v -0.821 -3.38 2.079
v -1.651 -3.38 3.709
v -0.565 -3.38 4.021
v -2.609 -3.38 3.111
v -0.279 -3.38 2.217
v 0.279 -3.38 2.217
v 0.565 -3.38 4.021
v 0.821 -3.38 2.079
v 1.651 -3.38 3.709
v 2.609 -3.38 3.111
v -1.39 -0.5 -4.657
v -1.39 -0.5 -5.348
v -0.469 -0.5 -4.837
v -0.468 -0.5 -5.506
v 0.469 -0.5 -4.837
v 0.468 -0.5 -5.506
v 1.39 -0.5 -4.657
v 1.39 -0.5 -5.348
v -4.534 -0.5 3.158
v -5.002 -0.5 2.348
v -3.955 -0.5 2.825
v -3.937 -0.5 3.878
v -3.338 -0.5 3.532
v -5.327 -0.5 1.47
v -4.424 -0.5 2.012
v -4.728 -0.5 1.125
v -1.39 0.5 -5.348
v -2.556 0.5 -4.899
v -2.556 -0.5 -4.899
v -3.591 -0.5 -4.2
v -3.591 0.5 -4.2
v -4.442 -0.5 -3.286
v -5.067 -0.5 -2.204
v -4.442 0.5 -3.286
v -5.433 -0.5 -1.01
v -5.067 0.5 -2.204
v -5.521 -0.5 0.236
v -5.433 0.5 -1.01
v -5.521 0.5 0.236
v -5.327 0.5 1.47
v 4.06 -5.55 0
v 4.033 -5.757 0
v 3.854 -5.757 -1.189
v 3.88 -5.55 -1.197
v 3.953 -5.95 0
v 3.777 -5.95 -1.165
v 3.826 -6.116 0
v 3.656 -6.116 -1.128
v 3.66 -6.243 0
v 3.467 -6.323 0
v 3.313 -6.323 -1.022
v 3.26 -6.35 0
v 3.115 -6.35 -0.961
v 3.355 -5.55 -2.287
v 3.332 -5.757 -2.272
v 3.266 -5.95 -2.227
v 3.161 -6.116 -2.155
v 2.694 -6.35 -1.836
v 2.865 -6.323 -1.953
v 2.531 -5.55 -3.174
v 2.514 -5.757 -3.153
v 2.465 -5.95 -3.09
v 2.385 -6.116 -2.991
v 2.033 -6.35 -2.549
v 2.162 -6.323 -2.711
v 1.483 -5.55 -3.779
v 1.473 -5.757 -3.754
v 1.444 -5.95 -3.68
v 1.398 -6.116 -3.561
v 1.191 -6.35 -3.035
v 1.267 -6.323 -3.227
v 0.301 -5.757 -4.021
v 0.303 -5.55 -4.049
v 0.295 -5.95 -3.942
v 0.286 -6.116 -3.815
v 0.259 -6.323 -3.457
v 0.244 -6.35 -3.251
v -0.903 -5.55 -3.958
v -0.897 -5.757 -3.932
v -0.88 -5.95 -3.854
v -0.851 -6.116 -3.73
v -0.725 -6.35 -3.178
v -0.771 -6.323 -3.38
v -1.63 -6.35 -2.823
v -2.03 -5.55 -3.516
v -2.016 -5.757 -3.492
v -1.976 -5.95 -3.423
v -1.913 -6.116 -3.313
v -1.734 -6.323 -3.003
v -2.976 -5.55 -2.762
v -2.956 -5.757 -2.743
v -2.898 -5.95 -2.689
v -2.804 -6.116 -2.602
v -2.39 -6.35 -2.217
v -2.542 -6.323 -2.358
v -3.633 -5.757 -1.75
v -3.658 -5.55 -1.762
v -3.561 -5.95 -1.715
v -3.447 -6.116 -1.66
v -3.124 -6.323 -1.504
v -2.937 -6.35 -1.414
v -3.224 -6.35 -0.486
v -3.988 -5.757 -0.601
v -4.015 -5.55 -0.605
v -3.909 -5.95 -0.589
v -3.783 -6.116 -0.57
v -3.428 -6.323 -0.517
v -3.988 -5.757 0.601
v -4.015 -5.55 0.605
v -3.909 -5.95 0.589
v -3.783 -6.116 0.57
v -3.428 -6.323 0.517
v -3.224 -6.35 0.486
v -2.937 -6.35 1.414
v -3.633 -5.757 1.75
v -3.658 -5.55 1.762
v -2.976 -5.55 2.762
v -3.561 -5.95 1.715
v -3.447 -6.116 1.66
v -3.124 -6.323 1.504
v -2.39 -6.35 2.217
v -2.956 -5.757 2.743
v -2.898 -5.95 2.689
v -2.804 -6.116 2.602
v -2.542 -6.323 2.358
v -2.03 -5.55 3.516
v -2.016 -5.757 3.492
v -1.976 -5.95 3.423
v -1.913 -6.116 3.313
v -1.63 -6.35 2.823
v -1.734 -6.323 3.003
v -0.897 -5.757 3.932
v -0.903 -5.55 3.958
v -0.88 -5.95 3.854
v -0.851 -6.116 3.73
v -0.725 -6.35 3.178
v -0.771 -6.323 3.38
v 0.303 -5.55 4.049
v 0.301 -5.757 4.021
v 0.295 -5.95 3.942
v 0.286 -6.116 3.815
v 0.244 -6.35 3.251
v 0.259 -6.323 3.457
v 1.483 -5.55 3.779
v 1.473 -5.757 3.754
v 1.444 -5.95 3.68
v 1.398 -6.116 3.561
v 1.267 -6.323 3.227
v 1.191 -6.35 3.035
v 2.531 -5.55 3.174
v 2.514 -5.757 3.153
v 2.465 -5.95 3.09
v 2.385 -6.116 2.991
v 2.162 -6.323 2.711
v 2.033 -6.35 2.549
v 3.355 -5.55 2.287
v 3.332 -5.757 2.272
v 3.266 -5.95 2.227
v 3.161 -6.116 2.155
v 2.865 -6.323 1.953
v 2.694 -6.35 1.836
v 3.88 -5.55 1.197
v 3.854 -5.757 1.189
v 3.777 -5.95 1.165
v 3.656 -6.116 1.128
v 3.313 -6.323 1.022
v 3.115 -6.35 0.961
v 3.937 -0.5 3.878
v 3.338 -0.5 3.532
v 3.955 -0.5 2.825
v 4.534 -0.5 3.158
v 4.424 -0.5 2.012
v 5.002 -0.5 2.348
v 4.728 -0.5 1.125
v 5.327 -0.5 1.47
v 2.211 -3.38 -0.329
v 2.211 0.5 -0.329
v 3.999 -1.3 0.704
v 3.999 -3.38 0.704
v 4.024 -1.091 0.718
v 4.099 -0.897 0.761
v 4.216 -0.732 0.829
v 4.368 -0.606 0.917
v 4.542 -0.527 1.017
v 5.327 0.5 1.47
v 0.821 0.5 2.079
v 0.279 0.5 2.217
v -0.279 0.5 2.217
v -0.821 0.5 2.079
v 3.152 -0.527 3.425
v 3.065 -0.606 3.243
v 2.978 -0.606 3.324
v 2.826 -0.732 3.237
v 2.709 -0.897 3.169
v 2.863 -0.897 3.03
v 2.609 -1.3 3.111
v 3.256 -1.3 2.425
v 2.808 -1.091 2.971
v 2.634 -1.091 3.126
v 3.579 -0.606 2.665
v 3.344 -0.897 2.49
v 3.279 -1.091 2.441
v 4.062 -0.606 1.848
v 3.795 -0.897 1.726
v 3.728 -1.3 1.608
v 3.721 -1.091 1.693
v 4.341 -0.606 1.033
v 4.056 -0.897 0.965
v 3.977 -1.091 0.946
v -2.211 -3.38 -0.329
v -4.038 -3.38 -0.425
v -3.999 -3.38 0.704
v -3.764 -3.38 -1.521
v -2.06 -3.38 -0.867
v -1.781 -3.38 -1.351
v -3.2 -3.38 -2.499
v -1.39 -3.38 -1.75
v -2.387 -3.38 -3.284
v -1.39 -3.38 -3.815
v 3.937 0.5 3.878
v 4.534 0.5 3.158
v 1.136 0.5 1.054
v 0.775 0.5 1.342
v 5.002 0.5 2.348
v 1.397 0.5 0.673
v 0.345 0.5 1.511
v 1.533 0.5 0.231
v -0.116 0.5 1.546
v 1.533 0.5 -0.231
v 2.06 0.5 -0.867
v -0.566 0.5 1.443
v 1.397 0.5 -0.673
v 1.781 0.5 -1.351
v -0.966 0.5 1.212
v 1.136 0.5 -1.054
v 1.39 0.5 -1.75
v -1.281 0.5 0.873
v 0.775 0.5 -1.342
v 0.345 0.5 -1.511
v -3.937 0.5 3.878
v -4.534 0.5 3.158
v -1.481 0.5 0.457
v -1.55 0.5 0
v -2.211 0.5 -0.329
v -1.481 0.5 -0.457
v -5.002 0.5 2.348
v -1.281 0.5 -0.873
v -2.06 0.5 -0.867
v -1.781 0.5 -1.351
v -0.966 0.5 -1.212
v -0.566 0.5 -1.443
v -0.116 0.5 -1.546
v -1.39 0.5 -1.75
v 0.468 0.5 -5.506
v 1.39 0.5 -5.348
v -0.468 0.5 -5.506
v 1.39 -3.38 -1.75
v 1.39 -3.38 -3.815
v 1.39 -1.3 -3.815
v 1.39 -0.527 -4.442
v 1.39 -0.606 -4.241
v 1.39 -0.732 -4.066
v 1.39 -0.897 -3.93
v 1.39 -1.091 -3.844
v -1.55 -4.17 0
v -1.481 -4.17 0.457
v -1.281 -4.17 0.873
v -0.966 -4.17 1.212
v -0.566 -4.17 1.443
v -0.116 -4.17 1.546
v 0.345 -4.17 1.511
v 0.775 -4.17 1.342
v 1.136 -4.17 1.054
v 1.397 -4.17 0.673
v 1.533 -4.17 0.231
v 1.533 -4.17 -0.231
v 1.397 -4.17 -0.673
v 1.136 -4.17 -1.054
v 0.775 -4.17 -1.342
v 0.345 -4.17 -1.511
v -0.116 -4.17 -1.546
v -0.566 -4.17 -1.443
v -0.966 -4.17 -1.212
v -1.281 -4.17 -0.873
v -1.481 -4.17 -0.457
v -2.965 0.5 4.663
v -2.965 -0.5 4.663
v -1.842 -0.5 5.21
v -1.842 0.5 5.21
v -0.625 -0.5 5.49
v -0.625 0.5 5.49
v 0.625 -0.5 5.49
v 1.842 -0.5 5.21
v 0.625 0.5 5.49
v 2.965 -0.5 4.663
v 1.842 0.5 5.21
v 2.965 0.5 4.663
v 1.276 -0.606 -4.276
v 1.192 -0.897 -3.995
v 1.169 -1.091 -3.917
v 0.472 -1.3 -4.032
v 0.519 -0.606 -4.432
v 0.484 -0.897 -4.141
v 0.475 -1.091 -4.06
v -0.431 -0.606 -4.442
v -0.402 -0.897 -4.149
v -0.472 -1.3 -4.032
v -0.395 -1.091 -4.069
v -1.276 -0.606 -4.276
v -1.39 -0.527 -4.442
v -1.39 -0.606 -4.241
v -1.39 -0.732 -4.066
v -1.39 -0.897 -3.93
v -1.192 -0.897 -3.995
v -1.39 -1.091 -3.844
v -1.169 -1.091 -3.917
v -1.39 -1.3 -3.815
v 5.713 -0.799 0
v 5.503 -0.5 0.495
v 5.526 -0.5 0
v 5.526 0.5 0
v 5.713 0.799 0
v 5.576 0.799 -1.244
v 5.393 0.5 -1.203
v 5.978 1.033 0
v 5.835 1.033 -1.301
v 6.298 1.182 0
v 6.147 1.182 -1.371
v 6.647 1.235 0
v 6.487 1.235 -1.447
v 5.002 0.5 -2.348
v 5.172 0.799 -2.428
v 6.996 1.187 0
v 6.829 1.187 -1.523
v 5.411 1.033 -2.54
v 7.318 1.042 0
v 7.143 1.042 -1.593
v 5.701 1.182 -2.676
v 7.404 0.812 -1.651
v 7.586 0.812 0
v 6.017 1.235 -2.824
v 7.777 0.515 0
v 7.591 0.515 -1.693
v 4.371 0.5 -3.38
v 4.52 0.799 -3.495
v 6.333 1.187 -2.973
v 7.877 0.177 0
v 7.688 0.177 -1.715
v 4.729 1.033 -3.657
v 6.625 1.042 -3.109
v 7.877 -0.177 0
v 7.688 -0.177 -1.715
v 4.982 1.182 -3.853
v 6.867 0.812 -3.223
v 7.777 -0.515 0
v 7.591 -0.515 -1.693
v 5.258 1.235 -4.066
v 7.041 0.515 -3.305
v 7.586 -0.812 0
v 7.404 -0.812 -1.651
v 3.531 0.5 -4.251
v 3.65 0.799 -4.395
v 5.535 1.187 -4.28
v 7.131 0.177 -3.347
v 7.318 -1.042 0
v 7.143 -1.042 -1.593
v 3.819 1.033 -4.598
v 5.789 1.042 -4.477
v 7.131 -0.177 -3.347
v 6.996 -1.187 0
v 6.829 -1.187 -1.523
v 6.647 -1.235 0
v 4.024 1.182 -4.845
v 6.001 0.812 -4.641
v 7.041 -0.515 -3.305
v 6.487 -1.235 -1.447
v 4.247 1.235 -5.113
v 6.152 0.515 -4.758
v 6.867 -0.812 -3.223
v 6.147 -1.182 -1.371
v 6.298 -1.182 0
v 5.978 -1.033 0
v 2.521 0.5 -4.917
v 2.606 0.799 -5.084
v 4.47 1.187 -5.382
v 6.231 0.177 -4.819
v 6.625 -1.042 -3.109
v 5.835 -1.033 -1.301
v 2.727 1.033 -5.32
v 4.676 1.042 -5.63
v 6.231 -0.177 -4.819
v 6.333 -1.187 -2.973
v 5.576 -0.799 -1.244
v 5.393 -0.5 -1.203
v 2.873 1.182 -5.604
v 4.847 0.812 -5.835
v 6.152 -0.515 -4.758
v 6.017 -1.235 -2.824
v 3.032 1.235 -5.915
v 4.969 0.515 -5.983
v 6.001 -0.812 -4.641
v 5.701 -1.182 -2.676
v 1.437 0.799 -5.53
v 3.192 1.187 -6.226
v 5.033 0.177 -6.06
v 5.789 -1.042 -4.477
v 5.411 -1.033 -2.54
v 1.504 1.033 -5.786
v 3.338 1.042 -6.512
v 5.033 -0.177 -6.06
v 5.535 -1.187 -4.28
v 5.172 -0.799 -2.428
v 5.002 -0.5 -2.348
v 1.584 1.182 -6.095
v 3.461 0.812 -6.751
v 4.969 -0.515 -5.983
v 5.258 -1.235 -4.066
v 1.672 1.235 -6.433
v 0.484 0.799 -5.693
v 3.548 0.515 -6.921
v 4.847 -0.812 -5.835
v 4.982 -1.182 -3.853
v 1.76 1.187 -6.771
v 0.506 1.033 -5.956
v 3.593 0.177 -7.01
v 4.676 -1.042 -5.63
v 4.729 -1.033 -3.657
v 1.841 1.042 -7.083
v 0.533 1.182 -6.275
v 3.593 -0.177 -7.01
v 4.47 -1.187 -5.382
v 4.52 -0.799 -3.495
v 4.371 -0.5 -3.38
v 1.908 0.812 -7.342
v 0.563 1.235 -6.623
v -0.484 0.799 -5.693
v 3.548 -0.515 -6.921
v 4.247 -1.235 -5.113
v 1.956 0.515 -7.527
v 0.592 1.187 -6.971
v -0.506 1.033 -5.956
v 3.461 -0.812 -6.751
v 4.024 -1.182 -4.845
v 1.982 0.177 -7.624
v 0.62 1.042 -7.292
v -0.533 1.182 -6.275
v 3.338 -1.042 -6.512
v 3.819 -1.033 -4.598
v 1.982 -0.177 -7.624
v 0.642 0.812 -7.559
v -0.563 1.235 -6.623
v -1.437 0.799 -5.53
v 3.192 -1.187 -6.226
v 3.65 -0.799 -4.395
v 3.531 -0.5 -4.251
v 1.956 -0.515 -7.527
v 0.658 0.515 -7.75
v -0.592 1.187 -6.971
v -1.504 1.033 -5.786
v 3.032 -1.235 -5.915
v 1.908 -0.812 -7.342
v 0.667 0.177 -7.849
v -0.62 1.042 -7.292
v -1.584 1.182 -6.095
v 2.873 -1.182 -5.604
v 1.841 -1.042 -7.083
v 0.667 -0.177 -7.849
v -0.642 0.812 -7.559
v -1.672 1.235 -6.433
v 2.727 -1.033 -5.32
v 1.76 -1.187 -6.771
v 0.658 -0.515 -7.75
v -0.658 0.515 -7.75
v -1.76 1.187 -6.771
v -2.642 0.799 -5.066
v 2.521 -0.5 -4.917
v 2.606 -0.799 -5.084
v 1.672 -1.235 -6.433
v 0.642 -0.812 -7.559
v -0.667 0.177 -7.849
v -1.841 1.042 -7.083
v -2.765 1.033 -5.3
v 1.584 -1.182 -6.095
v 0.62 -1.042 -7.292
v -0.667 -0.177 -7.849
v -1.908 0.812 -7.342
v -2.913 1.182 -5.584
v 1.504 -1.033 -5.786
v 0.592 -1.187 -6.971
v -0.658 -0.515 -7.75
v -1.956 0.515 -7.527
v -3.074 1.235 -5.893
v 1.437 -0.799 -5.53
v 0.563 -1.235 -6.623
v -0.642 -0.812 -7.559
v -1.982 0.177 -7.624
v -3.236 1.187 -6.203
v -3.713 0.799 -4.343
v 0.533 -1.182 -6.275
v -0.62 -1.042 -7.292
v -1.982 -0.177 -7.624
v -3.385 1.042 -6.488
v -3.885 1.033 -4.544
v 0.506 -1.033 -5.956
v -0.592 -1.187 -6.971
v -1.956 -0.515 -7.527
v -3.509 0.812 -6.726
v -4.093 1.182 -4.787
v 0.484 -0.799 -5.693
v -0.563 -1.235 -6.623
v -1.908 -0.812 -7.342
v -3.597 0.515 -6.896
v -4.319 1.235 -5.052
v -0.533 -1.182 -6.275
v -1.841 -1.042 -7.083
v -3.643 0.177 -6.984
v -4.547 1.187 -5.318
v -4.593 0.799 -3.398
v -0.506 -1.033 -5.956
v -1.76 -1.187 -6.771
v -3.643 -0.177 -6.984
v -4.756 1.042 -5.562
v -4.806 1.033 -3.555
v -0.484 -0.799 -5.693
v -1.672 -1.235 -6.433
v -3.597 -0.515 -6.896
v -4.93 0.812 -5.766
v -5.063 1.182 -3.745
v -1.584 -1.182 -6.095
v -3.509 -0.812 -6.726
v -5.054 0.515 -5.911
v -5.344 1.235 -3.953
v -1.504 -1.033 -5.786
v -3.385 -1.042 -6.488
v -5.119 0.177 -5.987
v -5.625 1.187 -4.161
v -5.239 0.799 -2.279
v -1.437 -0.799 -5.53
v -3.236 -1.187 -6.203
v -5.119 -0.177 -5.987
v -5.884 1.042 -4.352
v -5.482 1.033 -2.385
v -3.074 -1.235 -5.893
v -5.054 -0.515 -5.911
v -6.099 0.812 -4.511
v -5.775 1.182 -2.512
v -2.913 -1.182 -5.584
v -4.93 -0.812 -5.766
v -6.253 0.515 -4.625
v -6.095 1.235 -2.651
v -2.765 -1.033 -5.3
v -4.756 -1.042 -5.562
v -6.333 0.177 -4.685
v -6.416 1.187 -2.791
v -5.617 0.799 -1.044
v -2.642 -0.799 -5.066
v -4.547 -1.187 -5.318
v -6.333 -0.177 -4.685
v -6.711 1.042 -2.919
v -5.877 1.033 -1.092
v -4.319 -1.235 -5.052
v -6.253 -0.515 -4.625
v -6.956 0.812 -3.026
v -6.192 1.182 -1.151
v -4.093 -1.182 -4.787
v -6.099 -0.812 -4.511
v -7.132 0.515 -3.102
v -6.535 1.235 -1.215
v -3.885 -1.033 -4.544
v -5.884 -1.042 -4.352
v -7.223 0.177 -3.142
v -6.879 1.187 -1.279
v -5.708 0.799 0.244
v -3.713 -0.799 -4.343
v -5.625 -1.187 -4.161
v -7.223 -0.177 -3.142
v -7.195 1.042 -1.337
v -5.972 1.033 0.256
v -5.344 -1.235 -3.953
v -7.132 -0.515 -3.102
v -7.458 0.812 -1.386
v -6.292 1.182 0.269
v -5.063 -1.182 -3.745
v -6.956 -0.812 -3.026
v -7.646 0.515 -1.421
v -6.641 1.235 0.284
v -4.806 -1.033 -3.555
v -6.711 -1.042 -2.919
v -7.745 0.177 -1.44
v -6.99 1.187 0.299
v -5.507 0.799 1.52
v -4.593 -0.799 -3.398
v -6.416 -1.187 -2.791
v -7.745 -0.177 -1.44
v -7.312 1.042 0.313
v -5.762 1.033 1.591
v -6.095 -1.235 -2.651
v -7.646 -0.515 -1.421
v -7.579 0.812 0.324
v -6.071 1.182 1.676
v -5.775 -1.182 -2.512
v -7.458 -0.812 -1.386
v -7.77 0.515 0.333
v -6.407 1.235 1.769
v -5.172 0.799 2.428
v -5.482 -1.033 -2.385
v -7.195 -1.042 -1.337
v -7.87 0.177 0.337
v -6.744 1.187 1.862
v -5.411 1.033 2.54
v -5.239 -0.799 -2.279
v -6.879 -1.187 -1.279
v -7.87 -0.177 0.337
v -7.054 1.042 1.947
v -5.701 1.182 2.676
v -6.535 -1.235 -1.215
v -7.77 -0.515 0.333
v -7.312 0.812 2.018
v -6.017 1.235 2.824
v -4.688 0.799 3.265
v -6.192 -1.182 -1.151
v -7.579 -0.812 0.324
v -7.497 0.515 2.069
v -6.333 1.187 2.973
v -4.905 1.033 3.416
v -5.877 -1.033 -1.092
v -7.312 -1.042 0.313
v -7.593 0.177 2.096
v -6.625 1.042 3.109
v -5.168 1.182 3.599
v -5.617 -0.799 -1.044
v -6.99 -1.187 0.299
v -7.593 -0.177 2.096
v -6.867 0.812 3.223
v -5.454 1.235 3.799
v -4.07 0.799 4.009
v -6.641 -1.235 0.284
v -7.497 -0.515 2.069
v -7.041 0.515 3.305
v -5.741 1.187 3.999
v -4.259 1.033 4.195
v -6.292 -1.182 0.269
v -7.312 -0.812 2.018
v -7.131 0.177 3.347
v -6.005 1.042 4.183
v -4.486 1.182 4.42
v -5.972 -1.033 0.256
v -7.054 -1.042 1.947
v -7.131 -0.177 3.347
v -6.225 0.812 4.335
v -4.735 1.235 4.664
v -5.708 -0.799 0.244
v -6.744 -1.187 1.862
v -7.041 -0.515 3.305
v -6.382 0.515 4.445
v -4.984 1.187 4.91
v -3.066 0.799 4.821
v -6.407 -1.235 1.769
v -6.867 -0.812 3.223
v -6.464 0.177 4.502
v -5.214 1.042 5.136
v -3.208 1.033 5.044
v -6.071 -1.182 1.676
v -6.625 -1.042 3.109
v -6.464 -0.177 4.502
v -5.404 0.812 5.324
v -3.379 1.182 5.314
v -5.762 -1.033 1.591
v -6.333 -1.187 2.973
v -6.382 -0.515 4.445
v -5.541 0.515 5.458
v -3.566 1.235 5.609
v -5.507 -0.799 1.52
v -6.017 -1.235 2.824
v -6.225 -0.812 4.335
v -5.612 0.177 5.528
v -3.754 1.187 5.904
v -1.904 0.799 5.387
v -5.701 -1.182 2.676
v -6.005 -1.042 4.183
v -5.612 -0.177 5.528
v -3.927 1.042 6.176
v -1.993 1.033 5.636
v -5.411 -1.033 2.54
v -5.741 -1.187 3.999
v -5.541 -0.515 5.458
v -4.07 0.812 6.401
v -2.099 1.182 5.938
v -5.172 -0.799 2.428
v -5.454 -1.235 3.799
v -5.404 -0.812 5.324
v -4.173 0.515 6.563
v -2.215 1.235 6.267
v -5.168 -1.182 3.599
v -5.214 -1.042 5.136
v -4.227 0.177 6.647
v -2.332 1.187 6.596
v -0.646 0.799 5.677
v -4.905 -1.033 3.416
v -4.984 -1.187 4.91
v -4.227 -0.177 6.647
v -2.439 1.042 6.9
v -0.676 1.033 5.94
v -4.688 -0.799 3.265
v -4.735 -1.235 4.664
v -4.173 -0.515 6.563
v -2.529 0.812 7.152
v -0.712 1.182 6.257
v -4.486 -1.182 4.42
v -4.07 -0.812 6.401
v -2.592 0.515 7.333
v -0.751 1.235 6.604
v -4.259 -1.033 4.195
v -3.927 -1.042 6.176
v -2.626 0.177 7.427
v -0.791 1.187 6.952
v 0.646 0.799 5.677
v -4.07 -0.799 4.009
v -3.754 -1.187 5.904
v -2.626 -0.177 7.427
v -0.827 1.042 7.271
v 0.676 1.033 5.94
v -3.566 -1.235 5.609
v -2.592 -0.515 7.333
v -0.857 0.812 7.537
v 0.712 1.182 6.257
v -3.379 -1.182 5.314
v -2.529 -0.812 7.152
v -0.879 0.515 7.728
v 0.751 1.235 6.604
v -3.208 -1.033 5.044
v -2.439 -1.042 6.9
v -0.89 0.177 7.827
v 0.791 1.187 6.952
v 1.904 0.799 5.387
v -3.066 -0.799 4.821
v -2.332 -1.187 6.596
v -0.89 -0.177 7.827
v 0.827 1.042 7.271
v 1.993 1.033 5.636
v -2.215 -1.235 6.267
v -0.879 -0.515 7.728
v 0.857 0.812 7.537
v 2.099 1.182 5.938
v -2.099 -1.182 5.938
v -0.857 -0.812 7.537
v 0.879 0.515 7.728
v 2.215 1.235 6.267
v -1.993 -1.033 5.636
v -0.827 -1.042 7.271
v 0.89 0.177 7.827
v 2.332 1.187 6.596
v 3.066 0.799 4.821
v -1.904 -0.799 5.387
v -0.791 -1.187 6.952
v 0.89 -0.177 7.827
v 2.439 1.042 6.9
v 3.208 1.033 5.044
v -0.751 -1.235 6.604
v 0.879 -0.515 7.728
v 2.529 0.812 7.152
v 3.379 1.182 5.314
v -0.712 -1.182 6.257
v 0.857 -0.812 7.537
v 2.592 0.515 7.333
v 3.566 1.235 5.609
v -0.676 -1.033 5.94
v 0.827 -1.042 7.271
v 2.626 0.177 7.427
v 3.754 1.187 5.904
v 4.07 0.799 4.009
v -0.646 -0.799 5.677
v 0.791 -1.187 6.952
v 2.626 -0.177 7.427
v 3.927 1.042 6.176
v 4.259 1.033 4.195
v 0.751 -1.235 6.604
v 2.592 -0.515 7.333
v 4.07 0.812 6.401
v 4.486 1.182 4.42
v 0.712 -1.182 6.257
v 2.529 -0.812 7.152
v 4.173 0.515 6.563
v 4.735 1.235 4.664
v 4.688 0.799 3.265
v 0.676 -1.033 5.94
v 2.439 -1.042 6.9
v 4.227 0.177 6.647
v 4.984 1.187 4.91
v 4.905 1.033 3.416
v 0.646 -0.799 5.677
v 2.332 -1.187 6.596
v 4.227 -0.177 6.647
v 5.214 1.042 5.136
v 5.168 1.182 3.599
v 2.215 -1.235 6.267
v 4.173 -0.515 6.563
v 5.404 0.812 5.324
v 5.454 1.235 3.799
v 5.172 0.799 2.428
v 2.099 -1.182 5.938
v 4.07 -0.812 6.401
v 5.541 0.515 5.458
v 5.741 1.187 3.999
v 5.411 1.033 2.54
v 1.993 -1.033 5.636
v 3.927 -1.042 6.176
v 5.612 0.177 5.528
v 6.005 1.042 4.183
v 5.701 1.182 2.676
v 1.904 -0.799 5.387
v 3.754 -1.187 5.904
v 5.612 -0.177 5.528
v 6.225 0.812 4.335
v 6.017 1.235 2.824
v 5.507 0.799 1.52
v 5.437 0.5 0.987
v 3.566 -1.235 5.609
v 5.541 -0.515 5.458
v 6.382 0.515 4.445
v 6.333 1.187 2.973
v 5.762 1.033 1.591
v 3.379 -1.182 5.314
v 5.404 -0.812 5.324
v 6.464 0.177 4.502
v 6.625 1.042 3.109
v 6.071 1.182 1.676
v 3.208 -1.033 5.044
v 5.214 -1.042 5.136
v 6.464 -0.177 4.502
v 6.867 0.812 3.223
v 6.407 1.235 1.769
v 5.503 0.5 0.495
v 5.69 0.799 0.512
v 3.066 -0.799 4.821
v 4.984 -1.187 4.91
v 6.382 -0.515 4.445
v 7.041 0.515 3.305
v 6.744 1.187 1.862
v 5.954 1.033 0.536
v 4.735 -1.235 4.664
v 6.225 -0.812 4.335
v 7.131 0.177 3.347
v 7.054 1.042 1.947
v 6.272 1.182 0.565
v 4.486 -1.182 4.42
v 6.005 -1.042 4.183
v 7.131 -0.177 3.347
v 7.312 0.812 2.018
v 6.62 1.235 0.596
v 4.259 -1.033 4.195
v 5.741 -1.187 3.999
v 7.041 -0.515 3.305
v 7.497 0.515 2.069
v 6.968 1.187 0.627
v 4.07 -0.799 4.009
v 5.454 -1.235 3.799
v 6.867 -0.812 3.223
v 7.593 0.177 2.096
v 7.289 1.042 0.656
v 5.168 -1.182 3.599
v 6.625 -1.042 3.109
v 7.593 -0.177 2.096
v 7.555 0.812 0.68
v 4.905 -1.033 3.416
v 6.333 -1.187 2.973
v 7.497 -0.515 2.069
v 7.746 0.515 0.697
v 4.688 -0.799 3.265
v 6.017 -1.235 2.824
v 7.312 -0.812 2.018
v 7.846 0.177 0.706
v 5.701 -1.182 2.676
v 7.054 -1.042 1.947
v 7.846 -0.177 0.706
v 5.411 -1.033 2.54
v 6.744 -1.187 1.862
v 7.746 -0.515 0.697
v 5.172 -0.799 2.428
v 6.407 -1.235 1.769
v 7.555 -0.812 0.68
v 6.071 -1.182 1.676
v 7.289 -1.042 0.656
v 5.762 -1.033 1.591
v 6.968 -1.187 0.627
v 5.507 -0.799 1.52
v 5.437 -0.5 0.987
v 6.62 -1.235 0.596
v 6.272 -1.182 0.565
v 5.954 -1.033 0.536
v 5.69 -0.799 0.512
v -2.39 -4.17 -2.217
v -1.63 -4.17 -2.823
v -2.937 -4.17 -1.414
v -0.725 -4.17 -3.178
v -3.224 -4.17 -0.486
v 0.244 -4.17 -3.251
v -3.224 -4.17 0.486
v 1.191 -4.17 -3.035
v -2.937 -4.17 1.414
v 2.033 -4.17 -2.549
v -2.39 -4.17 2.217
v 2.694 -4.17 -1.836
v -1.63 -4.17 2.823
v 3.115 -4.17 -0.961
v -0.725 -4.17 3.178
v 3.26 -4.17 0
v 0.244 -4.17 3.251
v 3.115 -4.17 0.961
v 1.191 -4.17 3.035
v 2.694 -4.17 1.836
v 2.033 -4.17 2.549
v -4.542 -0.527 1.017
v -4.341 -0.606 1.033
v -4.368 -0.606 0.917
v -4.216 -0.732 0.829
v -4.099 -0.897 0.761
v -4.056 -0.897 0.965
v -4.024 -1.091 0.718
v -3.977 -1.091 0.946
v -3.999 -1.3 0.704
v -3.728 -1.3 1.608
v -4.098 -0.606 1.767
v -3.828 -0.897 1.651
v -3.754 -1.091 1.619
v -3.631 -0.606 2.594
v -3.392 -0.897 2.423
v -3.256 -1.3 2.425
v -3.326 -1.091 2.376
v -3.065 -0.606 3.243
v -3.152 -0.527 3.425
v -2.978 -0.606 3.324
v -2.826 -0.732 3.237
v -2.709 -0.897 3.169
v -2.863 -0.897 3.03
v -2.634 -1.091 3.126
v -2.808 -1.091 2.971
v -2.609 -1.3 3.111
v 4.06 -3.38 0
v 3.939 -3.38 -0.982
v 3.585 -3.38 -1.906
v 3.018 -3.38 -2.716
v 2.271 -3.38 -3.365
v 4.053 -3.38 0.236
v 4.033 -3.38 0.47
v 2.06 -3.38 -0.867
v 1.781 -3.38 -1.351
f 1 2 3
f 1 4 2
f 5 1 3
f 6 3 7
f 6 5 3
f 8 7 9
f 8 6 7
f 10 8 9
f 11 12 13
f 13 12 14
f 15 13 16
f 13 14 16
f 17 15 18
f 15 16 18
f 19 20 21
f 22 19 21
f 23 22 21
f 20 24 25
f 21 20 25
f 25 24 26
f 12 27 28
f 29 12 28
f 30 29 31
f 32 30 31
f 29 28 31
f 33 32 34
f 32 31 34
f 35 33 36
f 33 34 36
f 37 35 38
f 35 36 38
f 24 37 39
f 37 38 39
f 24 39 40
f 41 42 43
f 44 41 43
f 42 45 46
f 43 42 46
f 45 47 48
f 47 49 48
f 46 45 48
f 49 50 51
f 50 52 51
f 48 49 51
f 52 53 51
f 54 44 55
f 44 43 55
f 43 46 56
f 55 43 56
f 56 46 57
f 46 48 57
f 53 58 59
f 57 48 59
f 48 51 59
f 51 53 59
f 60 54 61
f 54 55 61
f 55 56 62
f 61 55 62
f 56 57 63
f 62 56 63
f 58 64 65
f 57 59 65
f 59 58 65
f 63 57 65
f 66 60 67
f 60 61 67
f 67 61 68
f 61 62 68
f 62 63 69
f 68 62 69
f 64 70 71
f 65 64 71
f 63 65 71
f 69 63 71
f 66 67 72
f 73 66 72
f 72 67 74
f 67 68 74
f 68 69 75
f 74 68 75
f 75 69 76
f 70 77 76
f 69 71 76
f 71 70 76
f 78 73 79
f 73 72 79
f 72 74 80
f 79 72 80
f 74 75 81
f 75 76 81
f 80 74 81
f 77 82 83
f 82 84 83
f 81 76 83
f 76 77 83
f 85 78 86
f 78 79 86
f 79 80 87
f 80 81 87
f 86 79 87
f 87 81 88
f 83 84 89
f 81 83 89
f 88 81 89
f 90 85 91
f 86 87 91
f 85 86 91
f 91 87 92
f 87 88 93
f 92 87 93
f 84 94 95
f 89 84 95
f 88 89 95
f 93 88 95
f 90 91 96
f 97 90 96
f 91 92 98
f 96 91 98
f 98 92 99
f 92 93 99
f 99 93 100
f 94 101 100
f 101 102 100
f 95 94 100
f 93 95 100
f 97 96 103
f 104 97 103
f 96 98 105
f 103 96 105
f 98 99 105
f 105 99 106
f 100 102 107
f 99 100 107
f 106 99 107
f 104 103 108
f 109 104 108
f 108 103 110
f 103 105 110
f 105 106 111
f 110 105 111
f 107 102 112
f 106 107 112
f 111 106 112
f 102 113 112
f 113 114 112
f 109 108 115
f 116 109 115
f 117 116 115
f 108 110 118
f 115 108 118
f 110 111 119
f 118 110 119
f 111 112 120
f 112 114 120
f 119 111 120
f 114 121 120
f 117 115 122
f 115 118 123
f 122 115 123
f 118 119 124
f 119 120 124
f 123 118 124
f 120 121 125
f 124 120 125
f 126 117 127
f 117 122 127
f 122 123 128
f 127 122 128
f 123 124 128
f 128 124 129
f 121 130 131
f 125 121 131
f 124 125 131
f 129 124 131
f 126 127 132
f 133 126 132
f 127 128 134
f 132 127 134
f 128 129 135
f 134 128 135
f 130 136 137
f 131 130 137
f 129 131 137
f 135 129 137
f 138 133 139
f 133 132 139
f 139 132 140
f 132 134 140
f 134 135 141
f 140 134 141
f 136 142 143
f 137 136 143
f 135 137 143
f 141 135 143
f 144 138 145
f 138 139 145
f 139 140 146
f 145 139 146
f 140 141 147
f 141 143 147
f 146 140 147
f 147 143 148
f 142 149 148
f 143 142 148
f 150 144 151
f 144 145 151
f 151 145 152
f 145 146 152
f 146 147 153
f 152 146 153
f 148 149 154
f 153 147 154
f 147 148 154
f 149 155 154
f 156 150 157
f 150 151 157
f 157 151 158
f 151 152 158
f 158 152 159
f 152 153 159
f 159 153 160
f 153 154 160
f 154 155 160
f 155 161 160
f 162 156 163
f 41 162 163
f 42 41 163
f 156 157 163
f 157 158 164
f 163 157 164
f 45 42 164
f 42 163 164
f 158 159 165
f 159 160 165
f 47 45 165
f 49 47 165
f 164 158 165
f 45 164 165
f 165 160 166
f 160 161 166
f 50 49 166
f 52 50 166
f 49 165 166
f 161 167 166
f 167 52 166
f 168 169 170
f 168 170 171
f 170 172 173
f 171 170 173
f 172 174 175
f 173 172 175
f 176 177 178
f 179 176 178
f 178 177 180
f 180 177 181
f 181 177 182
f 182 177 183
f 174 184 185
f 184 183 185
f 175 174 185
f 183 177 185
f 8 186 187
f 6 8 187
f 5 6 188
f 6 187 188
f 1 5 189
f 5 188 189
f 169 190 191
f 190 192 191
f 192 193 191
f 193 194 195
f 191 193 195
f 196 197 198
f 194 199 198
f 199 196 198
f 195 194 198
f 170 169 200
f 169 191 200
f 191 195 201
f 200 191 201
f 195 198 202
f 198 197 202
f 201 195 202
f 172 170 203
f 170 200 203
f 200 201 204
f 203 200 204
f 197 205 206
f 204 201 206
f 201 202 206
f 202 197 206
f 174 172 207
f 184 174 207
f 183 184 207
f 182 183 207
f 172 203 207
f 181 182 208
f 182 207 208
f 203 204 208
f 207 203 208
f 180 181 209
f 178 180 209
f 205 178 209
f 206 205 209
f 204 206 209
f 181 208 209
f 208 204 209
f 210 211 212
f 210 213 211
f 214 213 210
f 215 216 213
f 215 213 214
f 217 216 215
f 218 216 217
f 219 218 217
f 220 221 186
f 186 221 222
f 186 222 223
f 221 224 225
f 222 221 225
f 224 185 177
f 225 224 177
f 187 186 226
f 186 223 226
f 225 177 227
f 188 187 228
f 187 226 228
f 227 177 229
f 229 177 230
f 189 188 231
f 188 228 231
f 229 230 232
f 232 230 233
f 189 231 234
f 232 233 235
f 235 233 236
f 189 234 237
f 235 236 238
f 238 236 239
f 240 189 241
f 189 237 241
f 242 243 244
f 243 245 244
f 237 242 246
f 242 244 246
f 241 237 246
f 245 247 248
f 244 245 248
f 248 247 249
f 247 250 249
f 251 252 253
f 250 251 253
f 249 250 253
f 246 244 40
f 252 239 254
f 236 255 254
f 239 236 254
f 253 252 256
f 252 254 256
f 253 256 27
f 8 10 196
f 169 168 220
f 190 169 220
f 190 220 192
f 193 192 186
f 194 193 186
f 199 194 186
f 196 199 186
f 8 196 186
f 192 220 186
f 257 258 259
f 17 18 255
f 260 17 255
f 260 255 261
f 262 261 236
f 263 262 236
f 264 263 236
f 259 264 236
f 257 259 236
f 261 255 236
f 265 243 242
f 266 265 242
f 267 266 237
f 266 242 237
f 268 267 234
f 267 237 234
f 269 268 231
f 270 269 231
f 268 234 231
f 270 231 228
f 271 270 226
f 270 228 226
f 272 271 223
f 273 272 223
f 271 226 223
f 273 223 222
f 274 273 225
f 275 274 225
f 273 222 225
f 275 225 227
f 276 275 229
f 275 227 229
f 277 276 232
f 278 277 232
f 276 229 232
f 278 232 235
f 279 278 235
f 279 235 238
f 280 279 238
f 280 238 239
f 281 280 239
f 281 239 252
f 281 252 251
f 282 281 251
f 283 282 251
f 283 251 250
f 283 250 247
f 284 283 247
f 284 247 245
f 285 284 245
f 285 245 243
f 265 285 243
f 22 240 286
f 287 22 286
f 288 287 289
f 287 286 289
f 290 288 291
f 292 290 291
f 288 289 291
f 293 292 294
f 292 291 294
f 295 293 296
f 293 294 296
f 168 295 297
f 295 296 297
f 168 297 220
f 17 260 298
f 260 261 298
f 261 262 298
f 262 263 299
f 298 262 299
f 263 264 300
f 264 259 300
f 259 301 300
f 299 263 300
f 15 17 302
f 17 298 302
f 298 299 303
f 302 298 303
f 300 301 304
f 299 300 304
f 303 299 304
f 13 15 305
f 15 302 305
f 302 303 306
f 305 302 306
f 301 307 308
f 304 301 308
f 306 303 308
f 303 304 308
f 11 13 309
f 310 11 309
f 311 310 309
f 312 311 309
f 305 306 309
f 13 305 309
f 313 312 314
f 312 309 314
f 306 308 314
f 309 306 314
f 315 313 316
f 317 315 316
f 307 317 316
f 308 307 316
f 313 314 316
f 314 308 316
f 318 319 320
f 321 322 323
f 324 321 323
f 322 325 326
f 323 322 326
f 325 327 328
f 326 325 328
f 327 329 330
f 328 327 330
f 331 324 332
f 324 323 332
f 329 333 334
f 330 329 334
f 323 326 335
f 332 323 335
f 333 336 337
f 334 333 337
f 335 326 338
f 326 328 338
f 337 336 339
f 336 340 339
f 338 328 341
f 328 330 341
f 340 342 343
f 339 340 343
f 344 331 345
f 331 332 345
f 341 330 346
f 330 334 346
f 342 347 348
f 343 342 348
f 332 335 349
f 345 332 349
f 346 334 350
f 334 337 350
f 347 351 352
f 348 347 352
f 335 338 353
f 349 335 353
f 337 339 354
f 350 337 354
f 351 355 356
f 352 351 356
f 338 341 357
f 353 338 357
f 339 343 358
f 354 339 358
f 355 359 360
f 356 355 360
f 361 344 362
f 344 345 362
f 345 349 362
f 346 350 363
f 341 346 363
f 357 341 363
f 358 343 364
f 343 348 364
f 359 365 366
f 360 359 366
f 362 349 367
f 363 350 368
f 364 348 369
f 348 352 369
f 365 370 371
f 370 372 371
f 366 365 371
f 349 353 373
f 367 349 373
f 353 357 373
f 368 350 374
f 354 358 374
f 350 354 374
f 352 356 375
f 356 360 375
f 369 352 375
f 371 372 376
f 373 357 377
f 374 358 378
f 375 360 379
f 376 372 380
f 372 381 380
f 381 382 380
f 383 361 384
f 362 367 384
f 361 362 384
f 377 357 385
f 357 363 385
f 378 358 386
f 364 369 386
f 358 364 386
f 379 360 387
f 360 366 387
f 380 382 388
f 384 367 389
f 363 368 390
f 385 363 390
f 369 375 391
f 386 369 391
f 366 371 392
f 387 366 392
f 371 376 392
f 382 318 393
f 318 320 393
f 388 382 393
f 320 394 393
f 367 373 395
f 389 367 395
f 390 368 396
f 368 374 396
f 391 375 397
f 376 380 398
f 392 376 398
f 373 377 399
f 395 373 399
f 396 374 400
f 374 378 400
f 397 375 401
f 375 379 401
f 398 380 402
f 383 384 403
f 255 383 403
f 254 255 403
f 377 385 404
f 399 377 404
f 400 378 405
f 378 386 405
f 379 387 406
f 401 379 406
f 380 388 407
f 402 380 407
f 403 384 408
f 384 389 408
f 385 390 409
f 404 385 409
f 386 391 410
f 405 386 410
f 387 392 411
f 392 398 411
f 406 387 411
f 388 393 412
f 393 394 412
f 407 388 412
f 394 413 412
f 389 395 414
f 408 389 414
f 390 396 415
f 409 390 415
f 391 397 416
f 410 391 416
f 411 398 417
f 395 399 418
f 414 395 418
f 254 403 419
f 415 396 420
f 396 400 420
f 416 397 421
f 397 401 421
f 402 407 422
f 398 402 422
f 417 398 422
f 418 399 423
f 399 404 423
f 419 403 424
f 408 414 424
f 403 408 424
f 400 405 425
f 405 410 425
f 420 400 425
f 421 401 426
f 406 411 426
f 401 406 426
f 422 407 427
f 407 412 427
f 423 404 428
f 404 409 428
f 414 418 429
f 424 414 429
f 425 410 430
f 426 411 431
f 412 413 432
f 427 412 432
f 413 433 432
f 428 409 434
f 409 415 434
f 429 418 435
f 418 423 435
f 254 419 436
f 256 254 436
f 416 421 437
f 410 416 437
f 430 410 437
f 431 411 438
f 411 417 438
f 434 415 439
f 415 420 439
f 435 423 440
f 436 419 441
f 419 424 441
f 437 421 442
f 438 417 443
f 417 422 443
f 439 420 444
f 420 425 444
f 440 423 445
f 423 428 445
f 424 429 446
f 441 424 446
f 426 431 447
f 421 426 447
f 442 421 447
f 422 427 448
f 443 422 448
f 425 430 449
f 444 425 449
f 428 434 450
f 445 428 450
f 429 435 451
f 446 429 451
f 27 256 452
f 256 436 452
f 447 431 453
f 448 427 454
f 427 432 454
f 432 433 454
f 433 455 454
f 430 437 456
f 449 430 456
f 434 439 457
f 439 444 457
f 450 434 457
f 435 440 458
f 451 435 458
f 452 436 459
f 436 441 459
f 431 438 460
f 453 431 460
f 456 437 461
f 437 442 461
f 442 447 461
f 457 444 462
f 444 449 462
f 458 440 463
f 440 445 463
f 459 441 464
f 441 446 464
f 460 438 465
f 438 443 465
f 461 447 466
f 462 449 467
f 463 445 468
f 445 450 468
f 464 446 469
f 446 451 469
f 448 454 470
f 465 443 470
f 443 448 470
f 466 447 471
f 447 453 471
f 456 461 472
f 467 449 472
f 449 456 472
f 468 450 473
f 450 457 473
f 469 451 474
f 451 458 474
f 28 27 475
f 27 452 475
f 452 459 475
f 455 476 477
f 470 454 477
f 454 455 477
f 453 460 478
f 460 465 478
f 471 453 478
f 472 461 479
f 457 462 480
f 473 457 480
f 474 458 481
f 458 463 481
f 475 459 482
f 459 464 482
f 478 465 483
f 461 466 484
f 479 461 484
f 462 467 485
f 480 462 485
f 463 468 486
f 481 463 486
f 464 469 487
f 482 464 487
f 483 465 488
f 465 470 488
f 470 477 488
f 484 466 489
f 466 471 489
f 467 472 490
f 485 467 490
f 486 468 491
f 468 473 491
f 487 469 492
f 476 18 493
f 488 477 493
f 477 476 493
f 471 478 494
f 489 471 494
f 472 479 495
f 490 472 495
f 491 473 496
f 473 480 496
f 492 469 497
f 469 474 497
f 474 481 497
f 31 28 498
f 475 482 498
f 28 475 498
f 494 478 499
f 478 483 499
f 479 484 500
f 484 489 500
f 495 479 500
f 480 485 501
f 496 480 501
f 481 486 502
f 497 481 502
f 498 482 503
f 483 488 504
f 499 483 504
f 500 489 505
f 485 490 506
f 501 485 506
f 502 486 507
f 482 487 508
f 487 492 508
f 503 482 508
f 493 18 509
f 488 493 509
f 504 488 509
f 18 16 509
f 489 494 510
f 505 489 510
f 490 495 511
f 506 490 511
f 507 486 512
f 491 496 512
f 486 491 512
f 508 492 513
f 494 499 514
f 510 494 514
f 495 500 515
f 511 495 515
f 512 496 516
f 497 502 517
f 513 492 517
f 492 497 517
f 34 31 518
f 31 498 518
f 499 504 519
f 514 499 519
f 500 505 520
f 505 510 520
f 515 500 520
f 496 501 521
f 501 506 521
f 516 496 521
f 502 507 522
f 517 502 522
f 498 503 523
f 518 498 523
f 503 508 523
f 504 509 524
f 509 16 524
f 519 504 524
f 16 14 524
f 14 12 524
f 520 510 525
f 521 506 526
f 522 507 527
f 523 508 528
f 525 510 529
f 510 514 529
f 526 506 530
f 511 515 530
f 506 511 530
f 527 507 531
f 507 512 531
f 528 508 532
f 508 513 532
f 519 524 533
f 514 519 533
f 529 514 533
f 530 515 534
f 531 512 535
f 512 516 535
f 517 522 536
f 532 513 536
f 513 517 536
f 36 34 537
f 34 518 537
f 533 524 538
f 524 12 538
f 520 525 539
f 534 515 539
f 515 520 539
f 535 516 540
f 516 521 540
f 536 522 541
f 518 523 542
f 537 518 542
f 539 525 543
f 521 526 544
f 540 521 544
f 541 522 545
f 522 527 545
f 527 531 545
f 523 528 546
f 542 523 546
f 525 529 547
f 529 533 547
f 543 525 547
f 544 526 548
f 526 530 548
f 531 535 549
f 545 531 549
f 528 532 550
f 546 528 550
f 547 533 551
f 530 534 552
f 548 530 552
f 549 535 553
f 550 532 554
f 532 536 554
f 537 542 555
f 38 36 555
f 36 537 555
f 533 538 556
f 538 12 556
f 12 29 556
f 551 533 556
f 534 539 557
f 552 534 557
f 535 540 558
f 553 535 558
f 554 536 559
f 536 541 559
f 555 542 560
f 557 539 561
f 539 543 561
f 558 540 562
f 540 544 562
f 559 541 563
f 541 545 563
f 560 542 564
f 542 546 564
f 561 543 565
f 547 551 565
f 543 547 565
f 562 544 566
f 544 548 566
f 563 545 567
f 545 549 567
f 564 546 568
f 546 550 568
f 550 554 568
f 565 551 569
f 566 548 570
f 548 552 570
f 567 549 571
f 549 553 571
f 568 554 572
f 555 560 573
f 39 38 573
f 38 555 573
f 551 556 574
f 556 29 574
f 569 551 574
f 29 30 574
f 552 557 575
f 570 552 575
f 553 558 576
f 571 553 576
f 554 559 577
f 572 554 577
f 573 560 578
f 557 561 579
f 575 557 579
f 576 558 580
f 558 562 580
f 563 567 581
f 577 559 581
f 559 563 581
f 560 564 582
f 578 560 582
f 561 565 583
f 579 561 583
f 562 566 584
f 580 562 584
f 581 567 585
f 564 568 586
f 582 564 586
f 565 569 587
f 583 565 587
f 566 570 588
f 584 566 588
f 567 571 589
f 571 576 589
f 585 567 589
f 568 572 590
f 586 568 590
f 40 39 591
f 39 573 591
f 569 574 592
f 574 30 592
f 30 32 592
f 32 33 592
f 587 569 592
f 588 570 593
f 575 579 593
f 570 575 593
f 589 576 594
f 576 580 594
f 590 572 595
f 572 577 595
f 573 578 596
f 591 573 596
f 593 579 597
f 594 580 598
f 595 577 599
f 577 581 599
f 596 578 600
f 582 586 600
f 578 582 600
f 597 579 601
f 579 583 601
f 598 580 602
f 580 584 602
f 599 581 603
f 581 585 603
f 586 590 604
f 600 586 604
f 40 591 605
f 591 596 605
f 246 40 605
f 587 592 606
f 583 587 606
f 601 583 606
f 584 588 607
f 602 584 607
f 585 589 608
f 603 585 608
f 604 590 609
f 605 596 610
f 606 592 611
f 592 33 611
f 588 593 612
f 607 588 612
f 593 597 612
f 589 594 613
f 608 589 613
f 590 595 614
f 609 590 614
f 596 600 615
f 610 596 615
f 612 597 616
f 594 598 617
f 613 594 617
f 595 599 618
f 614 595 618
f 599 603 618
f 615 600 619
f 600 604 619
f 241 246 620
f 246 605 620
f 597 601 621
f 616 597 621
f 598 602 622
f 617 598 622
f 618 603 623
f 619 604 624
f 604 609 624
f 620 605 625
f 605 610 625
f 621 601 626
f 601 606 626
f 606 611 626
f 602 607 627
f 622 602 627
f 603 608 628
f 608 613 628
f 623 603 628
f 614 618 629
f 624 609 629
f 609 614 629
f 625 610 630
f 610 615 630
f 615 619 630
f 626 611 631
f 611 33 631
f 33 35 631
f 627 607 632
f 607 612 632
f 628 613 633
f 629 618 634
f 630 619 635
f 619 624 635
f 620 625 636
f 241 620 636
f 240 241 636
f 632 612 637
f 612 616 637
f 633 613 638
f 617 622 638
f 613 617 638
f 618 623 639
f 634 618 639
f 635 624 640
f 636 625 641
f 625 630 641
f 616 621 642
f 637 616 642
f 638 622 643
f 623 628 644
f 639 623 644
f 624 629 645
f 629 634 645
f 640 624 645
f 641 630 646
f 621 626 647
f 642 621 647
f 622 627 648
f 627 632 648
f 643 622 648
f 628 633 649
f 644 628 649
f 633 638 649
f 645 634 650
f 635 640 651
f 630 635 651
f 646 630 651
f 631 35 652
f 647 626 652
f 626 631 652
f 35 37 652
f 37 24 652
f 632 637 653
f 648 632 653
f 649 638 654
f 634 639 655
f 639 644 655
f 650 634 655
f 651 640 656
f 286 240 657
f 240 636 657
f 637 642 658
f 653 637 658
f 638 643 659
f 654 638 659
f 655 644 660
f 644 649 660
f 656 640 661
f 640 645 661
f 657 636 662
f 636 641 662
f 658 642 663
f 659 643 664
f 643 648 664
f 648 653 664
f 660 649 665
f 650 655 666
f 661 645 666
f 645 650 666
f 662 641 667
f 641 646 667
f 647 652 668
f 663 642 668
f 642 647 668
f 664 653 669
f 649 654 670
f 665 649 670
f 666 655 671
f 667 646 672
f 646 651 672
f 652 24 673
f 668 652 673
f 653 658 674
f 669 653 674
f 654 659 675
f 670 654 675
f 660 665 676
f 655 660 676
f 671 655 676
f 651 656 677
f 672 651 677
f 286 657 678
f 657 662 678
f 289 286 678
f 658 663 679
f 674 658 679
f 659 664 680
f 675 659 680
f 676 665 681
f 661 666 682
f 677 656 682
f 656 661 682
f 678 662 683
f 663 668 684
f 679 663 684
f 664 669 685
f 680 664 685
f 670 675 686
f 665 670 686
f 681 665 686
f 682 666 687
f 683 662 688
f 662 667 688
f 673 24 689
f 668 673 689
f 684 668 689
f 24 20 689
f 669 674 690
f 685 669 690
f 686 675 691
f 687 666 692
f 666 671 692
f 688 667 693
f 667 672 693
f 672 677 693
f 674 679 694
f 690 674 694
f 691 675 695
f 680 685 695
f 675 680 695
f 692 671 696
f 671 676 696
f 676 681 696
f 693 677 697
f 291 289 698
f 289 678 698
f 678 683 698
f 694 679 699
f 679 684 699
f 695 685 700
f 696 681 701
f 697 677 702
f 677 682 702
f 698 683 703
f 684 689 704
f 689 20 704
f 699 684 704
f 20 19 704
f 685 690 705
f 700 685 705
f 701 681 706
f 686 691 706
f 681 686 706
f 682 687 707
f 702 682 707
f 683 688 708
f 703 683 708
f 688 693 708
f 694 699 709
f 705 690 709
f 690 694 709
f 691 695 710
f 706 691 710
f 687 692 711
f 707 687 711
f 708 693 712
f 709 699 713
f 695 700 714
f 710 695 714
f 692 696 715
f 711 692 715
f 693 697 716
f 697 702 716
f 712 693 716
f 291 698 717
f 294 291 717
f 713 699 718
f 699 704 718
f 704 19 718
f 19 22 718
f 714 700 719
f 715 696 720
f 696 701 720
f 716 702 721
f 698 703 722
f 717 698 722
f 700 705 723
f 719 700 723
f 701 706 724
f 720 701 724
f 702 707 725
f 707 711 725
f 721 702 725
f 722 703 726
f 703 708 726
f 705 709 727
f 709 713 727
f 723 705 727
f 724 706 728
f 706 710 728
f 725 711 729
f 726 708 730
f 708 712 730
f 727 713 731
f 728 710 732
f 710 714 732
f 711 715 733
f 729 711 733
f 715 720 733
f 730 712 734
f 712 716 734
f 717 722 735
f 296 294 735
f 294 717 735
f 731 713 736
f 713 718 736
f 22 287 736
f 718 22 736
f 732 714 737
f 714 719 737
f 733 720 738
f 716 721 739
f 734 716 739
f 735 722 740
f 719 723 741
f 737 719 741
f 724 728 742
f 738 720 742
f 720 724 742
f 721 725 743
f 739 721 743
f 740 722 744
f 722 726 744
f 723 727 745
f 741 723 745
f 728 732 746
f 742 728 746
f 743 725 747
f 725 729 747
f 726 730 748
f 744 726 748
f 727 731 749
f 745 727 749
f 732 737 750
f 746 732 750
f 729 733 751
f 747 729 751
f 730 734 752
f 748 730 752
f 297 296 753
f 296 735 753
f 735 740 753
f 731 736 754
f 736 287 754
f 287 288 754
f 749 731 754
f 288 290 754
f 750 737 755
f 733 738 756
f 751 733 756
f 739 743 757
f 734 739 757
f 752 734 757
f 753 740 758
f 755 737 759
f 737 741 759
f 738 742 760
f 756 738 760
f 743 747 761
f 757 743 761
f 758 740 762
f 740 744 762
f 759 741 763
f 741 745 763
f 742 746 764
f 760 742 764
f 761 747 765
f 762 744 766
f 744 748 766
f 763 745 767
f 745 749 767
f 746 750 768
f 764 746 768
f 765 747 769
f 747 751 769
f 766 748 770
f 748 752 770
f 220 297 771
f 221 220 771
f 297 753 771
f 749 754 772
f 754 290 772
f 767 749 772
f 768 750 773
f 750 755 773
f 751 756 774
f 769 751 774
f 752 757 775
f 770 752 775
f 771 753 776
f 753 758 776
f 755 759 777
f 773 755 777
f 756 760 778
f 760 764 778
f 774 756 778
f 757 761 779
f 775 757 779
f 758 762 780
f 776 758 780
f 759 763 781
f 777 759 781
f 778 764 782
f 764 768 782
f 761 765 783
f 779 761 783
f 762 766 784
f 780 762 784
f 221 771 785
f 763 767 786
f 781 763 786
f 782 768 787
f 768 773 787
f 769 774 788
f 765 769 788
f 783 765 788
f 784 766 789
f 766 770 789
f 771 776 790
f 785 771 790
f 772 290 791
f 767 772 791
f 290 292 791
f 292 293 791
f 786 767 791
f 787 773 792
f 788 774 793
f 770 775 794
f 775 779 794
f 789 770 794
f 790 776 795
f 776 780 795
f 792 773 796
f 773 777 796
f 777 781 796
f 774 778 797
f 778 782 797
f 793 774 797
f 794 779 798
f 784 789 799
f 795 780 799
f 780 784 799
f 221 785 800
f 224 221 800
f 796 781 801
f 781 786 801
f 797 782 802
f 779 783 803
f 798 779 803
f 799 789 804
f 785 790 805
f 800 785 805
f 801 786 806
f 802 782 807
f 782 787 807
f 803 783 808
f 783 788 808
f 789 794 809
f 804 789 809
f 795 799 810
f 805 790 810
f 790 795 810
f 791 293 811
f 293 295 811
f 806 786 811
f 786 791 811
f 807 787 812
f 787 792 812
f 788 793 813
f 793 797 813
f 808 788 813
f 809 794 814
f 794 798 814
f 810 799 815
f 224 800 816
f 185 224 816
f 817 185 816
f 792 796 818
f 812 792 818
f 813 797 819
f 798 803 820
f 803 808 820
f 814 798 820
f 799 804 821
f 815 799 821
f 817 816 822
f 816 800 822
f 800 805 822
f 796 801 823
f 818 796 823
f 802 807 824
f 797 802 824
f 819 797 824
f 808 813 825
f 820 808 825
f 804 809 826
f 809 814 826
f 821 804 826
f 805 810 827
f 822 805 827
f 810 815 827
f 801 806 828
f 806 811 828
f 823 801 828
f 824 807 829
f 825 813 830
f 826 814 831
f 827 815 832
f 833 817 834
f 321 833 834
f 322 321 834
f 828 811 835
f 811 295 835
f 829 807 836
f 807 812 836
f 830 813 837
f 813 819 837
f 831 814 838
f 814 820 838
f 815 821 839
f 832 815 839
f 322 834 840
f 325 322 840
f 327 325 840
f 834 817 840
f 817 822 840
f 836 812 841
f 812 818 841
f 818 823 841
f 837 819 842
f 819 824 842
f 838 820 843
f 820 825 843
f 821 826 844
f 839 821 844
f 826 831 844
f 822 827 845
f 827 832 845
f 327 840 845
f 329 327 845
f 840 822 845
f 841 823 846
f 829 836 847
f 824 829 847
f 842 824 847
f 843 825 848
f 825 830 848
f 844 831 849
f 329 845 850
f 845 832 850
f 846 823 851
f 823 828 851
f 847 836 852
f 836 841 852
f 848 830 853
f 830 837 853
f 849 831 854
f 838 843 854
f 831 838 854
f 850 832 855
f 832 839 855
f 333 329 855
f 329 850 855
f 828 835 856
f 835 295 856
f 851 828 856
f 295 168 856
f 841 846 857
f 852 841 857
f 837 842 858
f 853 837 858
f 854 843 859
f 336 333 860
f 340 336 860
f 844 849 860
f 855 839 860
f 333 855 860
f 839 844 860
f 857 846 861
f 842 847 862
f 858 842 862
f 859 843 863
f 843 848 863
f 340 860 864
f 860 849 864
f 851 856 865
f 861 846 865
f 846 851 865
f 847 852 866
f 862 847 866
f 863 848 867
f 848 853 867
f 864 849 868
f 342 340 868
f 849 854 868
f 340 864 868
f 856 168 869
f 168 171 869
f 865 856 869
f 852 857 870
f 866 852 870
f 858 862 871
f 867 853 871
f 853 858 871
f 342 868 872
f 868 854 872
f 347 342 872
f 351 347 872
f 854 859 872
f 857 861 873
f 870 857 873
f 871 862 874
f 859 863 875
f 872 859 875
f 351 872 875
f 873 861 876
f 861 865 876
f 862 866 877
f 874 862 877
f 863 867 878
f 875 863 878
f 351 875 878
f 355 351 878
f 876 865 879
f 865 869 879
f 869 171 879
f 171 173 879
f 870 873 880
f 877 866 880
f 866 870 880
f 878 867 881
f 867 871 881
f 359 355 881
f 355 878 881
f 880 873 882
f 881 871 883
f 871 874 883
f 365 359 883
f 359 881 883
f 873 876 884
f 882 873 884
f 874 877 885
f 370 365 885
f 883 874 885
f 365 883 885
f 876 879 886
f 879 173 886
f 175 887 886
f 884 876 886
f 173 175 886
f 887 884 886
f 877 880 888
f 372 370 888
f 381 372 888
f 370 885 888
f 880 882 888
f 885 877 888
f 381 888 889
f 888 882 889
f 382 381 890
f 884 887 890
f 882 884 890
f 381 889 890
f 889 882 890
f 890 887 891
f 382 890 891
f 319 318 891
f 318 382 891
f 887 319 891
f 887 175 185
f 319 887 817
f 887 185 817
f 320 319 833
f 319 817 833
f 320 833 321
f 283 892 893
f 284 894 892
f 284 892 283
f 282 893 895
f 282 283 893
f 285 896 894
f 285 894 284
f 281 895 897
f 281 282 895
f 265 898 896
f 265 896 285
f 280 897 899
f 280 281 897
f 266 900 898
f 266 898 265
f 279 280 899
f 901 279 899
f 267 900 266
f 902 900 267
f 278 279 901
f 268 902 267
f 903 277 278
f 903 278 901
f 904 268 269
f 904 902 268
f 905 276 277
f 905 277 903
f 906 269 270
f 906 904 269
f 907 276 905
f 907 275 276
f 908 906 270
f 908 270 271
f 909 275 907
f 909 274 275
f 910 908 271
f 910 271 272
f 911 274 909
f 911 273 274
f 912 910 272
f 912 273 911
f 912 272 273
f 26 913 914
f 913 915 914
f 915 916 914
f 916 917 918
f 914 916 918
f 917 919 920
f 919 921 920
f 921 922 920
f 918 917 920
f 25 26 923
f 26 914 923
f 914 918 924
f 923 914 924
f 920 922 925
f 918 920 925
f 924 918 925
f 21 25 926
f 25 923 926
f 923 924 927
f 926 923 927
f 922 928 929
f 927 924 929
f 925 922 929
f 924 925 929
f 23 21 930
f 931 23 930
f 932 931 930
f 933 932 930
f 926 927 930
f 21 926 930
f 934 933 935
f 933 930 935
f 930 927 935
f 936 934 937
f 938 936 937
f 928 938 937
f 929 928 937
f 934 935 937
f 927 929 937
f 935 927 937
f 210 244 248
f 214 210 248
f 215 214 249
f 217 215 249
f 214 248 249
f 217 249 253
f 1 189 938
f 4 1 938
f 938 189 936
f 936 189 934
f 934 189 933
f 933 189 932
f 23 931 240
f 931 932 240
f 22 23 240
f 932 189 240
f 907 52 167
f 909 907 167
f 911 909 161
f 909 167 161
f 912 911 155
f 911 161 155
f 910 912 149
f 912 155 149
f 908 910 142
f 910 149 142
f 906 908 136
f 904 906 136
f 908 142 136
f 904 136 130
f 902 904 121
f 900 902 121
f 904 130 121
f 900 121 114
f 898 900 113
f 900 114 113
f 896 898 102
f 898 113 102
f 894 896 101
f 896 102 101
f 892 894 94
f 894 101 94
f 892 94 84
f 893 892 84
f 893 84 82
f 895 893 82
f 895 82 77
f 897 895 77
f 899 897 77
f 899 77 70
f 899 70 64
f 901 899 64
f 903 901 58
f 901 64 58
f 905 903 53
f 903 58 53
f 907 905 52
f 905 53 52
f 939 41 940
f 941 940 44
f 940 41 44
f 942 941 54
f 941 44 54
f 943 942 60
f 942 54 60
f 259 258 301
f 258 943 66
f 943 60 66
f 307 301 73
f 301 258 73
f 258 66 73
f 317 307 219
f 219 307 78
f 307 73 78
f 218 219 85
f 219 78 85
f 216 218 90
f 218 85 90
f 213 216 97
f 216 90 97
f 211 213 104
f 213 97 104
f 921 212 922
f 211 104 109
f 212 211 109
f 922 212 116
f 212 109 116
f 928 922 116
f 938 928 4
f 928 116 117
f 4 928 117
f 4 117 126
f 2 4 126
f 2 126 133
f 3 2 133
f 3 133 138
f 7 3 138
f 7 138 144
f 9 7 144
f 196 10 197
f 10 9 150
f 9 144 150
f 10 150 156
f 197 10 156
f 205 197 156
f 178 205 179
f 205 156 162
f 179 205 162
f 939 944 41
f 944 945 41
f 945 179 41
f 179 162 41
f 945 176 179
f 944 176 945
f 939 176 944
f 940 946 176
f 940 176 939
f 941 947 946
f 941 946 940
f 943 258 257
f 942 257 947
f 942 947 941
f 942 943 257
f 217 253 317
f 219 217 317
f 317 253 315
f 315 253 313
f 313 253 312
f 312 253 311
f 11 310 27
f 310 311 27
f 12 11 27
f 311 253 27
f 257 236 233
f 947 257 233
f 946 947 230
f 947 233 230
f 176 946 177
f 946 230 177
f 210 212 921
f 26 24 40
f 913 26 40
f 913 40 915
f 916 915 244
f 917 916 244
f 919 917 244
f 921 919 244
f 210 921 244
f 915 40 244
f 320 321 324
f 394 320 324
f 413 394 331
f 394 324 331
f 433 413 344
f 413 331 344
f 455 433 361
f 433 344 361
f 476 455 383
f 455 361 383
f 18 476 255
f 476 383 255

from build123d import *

# Parameters (mm, degrees)
SKETCH2_R           = 1.55
CUT_EXTRUDE5_DEPTH  = 14.87
CUT_EXTRUDE10_DEPTH = 3.88
SKETCH5_R           = 3.26
CUT_EXTRUDE11_DEPTH = 2.18


with BuildPart() as part:
    # Sketch1 → Revolve1 (revolve)
    with BuildSketch(Plane.XY):
        with BuildLine():
            Line((0, 0.5), (5.525741394, 0.5))
            ThreePointArc((5.525741394, 0.5), (7.89, 0), (5.525741394, -0.5))
            Line((5.525741394, -0.5), (4.86, -0.5))
            ThreePointArc((4.86, -0.5), (4.294314575, -0.734314575), (4.06, -1.3))
            Line((4.06, -1.3), (4.06, -5.55))
            ThreePointArc((4.06, -5.55), (3.825685425, -6.115685425), (3.26, -6.35))
            Line((3.26, -6.35), (0, -6.35))
            Line((0, -6.35), (0, 0))
            Line((0, 0), (0, 0.5))
        make_face()
    revolve(axis=Axis((0, 0, 0), (0, 1, 0)))

    # Sketch2 → Cut-Extrude5 (cut)
    with BuildSketch(Plane(origin=(0, 0.5, 0), x_dir=(1, 0, 0), z_dir=(0, 1, 0))):
        with Locations(Location((0, 0, 0), (0, 0, 180))):
            Circle(SKETCH2_R)
    extrude(amount=-CUT_EXTRUDE5_DEPTH, mode=Mode.SUBTRACT)

    # Sketch3 → Cut-Extrude10 (cut)
    with BuildSketch(Plane(origin=(0, 0.5, 0), x_dir=(1, 0, 0), z_dir=(0, 1, 0))):
        with BuildLine():
            ThreePointArc((-2.210699096, 0.32868603), (-1.935566777, 1.1175), (-1.39, 1.750178562))
            Line((-1.39, 1.750178562), (-1.39, 5.3480574))
            ThreePointArc((-1.39, 5.3480574), (-4.785432422, 2.762870697), (-5.326553569, -1.470253389))
            Line((-5.326553569, -1.470253389), (-2.210699096, 0.32868603))
        make_face()
        with BuildLine():
            Line((1.39, 5.3480574), (1.39, 1.750178562))
            ThreePointArc((1.39, 1.750178562), (1.935566777, 1.1175), (2.210699096, 0.32868603))
            Line((2.210699096, 0.32868603), (5.326553569, -1.470253389))
            ThreePointArc((5.326553569, -1.470253389), (5.475718012, -0.741842439), (5.525741394, 0))
            ThreePointArc((5.525741394, 0), (4.371189683, 3.380313404), (1.39, 5.3480574))
        make_face()
        with BuildLine():
            ThreePointArc((0.820699096, -2.078864592), (0, -2.235), (-0.820699096, -2.078864592))
            Line((-0.820699096, -2.078864592), (-3.936553569, -3.877804011))
            ThreePointArc((-3.936553569, -3.877804011), (0, -5.525741394), (3.936553569, -3.877804011))
            Line((3.936553569, -3.877804011), (0.820699096, -2.078864592))
        make_face()
    extrude(amount=-CUT_EXTRUDE10_DEPTH, mode=Mode.SUBTRACT)

    # Sketch5 → Cut-Extrude11 (cut)
    with BuildSketch(Plane.XZ.offset(6.35)):
        Circle(SKETCH5_R)
    extrude(amount=-CUT_EXTRUDE11_DEPTH, mode=Mode.SUBTRACT)


solid = part.part
